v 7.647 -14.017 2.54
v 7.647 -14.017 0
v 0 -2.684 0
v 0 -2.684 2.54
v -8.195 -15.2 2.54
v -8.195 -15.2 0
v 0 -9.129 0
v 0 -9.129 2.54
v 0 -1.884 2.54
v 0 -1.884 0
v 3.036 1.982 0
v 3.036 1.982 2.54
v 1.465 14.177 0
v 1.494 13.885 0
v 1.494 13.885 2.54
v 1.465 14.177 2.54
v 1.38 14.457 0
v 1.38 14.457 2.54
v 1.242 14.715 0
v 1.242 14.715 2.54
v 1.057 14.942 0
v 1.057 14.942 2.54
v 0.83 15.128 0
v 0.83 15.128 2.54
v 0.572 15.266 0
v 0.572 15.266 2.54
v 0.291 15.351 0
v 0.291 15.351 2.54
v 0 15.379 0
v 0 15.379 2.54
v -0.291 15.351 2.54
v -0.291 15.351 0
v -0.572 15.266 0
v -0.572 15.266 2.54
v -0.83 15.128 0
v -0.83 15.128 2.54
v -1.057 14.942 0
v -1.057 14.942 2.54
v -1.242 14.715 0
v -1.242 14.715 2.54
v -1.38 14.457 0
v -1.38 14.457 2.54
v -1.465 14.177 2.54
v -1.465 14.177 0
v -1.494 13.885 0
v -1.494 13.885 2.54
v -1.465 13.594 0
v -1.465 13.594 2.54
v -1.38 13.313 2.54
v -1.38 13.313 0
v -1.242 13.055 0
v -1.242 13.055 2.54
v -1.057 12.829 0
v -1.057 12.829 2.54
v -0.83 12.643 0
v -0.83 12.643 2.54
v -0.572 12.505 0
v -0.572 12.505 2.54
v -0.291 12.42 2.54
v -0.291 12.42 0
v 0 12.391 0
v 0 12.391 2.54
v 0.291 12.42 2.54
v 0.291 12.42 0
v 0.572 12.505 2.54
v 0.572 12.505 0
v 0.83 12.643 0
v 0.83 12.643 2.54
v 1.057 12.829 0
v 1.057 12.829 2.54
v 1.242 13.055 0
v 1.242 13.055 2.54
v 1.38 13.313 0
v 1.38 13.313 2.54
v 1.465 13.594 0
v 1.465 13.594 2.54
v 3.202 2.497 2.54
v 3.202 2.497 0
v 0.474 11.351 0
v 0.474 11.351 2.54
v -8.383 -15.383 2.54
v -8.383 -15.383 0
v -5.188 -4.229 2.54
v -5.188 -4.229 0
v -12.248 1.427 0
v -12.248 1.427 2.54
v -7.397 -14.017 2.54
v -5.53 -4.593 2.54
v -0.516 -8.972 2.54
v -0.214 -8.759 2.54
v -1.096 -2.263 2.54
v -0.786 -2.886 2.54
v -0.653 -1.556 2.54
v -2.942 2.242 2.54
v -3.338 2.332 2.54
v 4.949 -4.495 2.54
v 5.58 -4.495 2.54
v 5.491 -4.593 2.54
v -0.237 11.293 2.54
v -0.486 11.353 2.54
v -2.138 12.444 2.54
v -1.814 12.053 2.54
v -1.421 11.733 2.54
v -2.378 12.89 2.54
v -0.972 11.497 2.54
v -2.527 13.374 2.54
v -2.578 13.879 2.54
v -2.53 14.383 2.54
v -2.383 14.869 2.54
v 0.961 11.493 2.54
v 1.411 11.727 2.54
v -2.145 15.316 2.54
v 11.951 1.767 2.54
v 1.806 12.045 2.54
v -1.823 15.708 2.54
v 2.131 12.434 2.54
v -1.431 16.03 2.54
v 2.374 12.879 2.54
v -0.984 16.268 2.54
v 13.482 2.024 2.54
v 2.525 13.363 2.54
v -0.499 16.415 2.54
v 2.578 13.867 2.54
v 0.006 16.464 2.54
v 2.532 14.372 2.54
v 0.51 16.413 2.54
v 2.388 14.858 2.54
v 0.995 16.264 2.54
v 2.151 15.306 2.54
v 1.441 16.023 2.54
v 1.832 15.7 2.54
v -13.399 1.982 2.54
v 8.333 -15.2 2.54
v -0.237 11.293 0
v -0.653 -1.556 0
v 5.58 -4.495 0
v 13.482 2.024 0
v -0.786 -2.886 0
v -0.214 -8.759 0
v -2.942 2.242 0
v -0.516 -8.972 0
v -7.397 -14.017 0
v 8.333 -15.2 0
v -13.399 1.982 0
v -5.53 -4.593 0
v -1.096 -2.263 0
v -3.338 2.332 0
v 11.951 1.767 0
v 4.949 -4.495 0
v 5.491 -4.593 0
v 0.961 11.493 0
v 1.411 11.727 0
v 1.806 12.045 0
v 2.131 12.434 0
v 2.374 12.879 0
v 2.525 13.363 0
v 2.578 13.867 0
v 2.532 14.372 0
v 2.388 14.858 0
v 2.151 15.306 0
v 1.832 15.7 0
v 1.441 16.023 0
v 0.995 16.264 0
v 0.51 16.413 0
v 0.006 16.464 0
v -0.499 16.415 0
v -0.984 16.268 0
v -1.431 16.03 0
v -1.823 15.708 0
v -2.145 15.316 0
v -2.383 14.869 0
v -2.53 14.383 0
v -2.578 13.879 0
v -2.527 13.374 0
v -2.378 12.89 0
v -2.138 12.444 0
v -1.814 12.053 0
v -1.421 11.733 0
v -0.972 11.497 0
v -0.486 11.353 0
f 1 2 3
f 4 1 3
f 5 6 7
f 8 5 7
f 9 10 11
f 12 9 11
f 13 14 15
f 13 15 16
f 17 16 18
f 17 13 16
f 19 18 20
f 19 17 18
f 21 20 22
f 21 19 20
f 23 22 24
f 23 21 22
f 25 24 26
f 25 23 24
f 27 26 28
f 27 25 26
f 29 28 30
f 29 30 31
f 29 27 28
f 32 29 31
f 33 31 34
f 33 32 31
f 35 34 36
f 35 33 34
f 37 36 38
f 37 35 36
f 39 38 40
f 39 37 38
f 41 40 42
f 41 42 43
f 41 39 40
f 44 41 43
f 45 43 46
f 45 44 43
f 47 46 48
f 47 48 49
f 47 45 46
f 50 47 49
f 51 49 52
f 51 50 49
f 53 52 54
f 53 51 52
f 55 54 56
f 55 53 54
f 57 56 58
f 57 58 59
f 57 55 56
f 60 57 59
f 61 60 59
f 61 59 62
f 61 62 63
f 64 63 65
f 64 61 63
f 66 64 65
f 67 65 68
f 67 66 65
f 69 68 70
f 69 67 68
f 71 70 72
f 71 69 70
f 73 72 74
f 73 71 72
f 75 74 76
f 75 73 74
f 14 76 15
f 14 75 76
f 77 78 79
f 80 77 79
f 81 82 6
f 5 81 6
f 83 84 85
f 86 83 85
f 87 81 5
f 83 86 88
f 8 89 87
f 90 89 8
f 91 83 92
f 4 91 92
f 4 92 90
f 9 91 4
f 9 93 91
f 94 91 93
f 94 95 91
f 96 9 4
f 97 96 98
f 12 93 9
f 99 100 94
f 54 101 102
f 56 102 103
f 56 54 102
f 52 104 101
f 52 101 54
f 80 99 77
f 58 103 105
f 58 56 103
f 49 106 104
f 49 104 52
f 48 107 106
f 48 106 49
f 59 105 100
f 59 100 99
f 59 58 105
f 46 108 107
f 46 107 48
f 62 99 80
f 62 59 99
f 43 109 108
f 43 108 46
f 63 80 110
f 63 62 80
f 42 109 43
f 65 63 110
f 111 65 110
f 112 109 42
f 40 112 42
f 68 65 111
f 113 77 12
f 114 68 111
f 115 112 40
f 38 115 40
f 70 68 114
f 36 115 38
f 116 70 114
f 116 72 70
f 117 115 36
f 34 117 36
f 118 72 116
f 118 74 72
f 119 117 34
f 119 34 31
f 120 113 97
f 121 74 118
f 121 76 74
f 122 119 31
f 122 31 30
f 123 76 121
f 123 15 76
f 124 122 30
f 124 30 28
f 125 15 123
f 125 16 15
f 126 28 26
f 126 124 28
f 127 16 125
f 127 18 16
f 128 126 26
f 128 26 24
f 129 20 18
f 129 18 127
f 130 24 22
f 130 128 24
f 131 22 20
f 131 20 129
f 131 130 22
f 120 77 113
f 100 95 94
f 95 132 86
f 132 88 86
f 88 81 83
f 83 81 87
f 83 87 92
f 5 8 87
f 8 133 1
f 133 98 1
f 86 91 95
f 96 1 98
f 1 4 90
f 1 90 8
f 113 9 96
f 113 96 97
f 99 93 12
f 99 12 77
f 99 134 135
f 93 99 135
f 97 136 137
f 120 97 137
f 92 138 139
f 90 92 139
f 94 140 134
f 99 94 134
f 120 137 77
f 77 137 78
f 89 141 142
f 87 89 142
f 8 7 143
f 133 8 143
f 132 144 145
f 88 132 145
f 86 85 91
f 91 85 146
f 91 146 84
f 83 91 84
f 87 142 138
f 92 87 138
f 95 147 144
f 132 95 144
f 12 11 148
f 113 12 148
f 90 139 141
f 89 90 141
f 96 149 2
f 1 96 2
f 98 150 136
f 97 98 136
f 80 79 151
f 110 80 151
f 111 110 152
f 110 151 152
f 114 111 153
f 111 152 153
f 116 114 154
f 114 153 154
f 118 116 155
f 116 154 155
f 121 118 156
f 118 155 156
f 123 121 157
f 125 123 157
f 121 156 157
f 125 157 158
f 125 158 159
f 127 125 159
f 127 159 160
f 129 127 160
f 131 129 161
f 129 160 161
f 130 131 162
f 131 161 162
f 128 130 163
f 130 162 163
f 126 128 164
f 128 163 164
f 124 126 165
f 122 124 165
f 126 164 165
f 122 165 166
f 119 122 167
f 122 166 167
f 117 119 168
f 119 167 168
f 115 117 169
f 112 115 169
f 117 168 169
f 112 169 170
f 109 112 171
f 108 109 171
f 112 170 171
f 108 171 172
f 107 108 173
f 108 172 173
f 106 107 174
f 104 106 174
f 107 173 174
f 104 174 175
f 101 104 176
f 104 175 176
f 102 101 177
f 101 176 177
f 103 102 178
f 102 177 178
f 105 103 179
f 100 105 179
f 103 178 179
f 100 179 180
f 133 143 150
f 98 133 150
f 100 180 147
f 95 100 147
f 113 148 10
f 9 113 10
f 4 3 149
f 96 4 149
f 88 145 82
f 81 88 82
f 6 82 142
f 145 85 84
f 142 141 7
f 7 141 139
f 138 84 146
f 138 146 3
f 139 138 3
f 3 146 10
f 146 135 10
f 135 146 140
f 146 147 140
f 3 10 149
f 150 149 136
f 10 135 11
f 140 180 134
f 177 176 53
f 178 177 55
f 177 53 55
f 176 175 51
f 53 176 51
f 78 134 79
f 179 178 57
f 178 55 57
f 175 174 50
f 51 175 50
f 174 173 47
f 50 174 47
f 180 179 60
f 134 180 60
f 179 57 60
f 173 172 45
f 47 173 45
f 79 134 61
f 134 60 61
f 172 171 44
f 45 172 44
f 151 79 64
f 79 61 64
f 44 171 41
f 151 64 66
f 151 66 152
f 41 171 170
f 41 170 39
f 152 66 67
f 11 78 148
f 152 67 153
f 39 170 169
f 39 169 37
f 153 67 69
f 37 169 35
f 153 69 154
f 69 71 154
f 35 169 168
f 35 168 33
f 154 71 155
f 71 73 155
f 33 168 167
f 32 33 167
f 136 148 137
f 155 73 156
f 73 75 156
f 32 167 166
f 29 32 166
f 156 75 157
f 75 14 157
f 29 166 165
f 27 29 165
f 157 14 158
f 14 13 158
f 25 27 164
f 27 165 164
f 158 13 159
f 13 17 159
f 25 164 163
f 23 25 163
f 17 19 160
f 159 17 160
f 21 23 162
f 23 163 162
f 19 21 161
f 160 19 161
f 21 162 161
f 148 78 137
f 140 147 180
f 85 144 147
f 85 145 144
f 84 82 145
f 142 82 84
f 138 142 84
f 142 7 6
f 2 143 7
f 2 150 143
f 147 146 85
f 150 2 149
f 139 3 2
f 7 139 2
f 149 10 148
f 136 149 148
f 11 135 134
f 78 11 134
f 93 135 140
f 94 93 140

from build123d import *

# Parameters (mm, degrees)
F0_R     = 1.494135
F1_DEPTH = 2.54


with BuildPart() as f1:
    # F0 (on Top) → F1 (new body)
    with BuildSketch(Plane.XY):
        with BuildLine():
            Line((13.48222, 2.024483), (3.201543, 2.496718))
            Line((3.201543, 2.496718), (0.474253, 11.350792))
            ThreePointArc((0.474253, 11.350792), (0.005987, 16.463631), (-0.486017, 11.353022))
            Line((-0.486017, 11.353022), (-3.337723, 2.332209))
            Line((-3.337723, 2.332209), (-13.398782, 1.982259))
            Line((-13.398782, 1.982259), (-5.530131, -4.593079))
            Line((-5.530131, -4.593079), (-8.383425, -15.383421))
            Line((-8.383425, -15.383421), (-8.195174, -15.200495))
            Line((-8.195174, -15.200495), (0, -9.12891))
            Line((0, -9.12891), (8.333031, -15.200495))
            Line((8.333031, -15.200495), (5.491082, -4.593079))
            Line((5.491082, -4.593079), (5.580035, -4.494939))
            Line((5.580035, -4.494939), (13.48222, 2.024483))
        make_face()
        Polygon((-0.515748, -8.972427), (-7.396878, -14.017268), (-0.785596, -2.886029), (-0.214107, -8.758916), align=None, mode=Mode.SUBTRACT)
        Polygon((-12.247529, 1.427319), (-1.096065, -2.263094), (-5.187609, -4.228639), align=None, mode=Mode.SUBTRACT)
        Polygon((4.948679, -4.494939), (7.647161, -14.017268), (0, -2.683643), align=None, mode=Mode.SUBTRACT)
        Polygon((11.950911, 1.767228), (0, -1.88404), (3.035744, 1.982259), align=None, mode=Mode.SUBTRACT)
        Polygon((-2.941626, 2.241765), (-0.236567, 11.293307), (-0.65273, -1.555721), align=None, mode=Mode.SUBTRACT)
        with Locations((0, 13.88522)):
            Circle(F0_R, mode=Mode.SUBTRACT)
    extrude(amount=F1_DEPTH)


solid = f1.part
